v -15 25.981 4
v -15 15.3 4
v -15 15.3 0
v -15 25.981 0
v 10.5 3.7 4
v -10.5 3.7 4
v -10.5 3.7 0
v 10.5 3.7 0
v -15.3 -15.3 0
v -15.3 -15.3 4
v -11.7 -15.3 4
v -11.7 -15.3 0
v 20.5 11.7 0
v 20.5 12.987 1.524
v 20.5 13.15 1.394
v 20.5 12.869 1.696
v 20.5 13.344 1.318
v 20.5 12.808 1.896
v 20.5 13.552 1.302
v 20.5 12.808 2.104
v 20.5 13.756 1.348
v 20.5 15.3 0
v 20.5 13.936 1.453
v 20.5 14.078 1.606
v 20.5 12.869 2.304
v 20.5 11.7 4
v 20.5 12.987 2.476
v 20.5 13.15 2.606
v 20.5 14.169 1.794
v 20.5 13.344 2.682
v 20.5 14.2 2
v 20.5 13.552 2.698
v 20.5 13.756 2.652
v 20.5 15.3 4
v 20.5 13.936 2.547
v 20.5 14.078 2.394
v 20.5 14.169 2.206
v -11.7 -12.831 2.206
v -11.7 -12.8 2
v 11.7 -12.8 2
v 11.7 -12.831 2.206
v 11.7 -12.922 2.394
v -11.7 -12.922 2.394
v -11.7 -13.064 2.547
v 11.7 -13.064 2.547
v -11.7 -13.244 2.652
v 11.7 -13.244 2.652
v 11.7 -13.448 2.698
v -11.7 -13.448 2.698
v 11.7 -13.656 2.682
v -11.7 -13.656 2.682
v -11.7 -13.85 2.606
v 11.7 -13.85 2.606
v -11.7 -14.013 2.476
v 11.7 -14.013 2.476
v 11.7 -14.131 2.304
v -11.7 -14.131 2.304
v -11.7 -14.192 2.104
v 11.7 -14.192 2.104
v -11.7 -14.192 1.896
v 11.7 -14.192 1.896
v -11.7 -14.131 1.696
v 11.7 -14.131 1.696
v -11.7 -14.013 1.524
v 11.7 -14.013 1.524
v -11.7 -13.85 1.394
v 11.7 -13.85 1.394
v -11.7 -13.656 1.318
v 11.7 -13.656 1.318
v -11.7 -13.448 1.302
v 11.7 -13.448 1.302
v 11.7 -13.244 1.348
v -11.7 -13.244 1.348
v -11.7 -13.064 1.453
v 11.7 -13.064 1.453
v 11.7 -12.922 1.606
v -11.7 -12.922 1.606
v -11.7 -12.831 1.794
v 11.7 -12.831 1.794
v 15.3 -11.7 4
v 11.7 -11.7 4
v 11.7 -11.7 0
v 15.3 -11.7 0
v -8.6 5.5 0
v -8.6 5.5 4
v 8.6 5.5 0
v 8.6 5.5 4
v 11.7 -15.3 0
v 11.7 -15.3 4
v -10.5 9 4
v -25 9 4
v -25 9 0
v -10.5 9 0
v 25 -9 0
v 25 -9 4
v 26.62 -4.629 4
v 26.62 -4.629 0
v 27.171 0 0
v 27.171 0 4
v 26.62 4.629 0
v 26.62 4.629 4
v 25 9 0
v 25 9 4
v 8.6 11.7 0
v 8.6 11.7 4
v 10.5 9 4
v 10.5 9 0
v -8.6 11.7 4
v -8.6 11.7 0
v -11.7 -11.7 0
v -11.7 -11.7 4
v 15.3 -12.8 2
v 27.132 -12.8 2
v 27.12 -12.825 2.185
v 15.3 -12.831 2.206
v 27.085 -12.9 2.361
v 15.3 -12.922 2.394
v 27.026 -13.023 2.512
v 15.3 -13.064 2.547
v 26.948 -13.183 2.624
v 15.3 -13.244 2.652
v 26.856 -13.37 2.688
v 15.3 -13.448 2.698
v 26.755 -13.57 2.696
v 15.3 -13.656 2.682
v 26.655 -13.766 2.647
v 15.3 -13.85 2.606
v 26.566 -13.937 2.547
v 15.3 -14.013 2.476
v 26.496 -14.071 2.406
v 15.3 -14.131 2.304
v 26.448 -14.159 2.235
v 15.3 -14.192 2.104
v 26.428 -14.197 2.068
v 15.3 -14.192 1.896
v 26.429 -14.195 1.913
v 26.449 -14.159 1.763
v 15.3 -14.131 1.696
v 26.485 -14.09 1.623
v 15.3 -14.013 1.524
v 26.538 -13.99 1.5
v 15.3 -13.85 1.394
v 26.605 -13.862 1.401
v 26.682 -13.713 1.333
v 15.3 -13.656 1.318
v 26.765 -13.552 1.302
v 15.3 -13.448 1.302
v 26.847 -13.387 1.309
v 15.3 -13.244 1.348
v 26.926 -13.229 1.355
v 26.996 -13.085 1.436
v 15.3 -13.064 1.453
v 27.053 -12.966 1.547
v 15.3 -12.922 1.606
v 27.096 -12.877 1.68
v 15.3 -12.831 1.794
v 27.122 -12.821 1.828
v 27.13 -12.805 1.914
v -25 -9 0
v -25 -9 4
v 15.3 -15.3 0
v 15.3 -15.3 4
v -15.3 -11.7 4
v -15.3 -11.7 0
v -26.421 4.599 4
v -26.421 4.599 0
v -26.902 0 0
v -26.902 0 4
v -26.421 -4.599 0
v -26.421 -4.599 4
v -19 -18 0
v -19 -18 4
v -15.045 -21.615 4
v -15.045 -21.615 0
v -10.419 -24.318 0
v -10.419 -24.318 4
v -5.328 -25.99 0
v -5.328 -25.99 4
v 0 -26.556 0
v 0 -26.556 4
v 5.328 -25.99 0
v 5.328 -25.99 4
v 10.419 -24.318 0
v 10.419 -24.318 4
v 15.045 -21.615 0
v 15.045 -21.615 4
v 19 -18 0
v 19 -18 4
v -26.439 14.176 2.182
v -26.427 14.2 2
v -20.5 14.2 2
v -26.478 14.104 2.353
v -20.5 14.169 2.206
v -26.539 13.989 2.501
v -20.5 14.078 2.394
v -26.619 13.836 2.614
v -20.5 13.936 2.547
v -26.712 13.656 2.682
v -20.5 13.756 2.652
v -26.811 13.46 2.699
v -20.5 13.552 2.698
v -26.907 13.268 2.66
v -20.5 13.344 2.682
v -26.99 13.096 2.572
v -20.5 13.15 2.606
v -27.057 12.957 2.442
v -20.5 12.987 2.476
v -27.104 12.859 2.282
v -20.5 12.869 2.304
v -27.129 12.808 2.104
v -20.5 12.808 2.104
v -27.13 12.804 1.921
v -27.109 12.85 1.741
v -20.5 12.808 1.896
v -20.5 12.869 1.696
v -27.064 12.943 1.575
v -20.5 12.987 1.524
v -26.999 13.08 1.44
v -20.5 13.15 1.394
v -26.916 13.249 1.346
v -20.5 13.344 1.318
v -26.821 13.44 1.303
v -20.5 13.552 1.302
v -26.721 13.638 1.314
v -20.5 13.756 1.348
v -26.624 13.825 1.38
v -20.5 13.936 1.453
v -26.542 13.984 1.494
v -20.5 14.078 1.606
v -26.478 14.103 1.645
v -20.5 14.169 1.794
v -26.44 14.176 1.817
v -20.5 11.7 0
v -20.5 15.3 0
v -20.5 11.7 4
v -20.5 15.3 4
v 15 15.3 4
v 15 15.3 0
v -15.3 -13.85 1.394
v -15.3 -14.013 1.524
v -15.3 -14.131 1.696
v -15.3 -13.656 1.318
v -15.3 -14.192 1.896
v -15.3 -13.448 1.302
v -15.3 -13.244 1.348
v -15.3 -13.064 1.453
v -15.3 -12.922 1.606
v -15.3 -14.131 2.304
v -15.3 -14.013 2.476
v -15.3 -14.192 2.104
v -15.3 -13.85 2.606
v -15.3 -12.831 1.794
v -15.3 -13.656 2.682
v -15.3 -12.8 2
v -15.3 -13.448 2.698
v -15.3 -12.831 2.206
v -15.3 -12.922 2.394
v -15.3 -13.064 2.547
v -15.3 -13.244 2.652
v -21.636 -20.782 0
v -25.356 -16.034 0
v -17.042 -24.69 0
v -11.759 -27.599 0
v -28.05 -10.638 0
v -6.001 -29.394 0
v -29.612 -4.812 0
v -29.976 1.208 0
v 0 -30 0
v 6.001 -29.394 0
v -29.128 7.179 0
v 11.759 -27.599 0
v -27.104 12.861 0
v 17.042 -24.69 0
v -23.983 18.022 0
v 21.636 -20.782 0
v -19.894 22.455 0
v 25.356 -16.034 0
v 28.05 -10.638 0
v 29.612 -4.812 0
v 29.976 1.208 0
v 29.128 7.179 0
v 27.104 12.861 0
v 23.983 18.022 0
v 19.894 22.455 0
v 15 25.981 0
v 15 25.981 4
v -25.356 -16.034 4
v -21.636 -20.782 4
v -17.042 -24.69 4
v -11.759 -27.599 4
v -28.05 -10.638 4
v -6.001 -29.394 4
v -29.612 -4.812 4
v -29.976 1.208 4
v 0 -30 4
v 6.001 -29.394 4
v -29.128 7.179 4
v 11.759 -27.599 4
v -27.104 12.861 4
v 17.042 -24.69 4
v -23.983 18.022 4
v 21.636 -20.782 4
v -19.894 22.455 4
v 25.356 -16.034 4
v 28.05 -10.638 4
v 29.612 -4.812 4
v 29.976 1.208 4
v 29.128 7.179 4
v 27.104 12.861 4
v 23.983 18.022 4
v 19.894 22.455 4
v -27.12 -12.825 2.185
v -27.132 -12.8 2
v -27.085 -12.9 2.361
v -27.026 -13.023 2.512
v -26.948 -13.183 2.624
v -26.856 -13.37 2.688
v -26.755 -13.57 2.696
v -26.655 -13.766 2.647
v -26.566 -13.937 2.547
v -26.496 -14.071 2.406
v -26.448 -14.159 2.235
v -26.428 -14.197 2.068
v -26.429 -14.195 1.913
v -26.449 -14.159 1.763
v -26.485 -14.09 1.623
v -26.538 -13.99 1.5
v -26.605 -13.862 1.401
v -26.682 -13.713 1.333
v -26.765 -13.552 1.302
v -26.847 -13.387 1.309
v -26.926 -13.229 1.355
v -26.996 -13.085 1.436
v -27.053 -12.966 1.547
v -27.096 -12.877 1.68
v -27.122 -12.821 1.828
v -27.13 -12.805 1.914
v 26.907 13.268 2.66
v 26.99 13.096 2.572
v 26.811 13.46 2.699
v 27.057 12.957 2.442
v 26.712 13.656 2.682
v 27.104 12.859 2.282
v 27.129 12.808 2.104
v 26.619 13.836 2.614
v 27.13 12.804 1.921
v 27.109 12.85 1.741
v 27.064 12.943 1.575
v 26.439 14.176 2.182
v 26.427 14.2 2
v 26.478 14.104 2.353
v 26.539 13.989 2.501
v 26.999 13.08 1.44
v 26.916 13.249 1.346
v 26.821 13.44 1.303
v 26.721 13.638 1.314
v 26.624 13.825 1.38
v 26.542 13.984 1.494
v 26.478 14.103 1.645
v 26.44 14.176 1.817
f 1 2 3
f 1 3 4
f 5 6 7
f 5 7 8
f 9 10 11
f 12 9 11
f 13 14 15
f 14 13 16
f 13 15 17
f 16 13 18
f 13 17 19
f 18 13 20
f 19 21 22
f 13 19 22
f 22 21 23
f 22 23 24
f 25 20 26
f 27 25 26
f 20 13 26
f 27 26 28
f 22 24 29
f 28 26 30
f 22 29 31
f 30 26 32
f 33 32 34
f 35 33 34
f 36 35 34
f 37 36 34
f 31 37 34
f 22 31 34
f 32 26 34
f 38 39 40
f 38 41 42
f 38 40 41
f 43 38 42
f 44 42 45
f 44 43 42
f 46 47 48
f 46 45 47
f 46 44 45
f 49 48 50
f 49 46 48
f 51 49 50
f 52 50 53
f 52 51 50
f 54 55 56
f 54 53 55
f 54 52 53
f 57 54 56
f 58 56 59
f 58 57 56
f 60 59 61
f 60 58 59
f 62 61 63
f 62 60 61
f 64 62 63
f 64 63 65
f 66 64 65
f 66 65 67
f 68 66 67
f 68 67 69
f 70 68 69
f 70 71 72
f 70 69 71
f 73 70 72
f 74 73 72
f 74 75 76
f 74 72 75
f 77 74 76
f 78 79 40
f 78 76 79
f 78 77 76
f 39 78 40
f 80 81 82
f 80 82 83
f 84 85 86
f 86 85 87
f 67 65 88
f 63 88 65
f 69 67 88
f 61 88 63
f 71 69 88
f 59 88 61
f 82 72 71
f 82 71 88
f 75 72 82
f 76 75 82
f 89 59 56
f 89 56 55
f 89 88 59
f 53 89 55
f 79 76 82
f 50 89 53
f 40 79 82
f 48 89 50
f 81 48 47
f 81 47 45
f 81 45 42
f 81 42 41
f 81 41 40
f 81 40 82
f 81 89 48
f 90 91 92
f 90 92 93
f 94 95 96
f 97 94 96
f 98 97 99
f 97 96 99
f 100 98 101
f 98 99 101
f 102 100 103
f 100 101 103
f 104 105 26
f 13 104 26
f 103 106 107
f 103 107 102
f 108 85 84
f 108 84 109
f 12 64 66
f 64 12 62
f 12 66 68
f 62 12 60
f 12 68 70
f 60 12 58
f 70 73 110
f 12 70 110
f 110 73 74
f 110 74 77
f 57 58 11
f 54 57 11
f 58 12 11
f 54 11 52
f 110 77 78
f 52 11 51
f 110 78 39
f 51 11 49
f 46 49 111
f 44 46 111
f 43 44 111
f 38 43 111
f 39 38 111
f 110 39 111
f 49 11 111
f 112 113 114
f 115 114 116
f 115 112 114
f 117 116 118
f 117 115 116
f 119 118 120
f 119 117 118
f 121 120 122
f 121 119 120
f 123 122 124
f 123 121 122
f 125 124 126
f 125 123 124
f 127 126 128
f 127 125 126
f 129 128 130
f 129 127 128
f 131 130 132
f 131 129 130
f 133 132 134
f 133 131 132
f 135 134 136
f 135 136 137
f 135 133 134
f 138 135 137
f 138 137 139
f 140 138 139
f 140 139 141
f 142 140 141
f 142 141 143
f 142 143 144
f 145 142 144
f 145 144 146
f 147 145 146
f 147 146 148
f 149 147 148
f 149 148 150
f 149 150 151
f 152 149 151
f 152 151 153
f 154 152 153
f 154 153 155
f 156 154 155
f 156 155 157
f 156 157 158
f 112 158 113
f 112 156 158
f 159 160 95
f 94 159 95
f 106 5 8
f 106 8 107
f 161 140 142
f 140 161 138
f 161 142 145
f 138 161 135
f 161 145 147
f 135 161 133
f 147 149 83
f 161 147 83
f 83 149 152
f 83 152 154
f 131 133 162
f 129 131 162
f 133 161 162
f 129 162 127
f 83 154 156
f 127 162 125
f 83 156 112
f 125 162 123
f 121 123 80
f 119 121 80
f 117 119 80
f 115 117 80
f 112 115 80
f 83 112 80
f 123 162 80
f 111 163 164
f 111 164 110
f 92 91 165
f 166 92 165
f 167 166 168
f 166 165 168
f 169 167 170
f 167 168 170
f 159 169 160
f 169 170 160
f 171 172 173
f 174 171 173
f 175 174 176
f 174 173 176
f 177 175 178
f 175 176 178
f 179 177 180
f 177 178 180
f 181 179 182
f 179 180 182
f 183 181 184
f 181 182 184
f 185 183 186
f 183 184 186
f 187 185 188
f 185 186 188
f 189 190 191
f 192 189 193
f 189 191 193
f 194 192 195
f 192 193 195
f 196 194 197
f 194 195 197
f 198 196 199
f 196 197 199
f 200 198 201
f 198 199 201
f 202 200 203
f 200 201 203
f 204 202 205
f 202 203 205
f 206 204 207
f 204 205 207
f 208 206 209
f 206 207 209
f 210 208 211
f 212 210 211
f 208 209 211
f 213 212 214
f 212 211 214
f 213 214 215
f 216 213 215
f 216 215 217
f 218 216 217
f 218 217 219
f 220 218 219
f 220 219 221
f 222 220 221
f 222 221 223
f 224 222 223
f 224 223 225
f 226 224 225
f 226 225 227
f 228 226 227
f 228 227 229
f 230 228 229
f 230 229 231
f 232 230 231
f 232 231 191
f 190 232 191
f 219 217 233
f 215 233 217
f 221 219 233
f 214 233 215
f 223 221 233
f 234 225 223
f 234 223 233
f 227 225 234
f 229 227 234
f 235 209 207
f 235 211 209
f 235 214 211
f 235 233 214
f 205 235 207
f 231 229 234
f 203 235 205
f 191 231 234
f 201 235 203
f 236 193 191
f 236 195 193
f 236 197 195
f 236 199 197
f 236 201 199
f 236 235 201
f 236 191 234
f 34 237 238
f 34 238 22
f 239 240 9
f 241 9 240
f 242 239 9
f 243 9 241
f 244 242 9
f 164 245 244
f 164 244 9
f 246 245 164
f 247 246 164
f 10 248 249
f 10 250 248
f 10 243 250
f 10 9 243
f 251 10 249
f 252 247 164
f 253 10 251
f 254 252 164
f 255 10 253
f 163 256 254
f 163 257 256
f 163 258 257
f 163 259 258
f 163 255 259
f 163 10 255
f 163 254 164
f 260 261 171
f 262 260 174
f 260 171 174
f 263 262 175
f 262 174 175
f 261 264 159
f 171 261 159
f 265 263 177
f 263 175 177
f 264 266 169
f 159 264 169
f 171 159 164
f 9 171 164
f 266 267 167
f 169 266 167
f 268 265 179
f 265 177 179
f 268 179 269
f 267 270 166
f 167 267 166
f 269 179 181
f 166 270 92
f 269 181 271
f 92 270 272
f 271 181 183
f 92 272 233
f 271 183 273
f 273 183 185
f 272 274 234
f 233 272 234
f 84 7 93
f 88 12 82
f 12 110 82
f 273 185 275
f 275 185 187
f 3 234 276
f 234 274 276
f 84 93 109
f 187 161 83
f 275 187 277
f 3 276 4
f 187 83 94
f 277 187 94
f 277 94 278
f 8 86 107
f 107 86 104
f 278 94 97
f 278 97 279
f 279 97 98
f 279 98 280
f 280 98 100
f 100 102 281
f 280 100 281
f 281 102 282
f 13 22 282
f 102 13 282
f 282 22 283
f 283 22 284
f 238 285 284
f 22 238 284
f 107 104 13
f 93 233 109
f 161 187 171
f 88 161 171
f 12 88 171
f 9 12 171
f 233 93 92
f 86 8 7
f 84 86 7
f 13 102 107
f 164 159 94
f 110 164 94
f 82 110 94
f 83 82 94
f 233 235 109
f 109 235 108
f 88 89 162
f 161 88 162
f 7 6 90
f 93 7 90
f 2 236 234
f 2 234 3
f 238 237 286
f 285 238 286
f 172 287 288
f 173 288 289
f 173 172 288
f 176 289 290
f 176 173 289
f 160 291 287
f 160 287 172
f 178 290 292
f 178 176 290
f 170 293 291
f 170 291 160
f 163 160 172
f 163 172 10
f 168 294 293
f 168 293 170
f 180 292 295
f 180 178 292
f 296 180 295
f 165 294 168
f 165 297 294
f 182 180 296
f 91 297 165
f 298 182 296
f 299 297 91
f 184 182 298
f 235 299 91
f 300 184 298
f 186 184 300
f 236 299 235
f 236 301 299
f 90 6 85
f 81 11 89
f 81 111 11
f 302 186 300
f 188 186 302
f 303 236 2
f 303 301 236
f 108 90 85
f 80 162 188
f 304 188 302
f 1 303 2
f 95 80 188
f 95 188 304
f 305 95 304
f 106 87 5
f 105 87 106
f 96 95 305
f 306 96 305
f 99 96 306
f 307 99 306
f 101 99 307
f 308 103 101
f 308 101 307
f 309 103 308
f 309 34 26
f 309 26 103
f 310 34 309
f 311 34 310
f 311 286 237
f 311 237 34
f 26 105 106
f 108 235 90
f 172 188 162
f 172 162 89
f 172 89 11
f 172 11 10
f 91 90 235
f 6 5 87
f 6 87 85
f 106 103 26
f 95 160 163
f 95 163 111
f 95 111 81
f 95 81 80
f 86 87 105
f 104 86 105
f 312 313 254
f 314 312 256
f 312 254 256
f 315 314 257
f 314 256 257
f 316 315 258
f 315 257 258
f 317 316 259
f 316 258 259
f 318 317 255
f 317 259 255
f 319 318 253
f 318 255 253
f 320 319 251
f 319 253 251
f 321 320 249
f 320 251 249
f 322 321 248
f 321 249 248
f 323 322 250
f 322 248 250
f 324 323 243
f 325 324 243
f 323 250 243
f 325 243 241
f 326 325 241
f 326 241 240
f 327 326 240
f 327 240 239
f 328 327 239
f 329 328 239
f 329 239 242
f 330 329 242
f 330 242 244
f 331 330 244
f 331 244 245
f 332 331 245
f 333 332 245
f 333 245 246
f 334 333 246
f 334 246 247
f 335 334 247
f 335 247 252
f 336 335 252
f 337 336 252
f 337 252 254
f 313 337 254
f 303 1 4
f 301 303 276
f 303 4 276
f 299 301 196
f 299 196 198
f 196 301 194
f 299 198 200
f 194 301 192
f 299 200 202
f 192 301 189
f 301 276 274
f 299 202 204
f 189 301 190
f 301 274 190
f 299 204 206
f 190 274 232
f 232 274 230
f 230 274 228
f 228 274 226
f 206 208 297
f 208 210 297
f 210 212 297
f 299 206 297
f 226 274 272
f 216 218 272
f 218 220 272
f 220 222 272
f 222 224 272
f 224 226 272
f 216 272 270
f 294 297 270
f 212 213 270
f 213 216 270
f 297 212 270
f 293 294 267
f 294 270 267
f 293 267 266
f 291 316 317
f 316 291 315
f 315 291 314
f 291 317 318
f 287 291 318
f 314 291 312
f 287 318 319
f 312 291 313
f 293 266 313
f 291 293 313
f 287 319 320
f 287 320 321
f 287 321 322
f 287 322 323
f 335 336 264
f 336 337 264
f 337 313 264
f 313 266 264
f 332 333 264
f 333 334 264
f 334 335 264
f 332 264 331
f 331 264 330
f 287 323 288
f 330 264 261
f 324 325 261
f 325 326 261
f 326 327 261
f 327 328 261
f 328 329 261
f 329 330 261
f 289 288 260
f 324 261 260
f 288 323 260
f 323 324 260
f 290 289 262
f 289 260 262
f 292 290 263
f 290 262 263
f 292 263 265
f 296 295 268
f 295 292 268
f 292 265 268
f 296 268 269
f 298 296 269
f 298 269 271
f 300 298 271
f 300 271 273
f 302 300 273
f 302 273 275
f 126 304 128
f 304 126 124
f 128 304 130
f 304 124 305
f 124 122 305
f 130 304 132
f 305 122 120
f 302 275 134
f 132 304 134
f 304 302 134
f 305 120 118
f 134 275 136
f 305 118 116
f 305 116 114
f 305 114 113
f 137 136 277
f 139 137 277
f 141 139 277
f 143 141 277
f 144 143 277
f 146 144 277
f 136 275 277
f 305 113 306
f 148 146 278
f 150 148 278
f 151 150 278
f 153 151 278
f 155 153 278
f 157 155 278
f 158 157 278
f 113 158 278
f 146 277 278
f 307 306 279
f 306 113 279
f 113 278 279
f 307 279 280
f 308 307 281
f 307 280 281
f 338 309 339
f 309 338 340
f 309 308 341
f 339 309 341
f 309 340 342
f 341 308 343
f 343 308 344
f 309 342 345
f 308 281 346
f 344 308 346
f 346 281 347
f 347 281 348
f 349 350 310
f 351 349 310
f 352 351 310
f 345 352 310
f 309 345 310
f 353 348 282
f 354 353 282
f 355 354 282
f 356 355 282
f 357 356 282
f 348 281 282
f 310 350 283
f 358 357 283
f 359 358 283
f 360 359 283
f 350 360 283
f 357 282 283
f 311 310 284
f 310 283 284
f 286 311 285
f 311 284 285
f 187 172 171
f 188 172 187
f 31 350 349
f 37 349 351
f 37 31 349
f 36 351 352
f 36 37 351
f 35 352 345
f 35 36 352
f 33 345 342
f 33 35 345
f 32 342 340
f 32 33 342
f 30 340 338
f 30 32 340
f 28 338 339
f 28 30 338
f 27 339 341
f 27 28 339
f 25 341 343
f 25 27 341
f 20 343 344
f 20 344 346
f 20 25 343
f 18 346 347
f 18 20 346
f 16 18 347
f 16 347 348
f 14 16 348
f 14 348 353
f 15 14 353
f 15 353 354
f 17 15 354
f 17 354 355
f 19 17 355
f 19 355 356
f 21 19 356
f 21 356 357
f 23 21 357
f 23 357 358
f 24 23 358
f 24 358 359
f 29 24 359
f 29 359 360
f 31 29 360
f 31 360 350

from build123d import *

# Parameters (mm, degrees)
SKETCH_R             = 30
PAD_DEPTH            = 4
SKETCH001_W          = 3.6
SKETCH001_H          = 3.6
POCKET_DEPTH         = 5
SKETCH002_W          = 41
SKETCH002_H          = 3.6
POCKET001_DEPTH      = 5
SKETCH003_W          = 30
SKETCH003_H          = 18
POCKET002_DEPTH      = 5
POCKET003_DEPTH      = 5
SKETCH005_R          = 0.7
POCKET004_DEPTH      = 14.701
POCKET004_DEPTH_BACK = -45.301
SKETCH006_R          = 0.7
POCKET005_DEPTH      = 9.501
POCKET005_DEPTH_BACK = -50.501
SKETCH007_W          = 21
SKETCH007_H          = 5.3
PAD001_DEPTH         = 4
SKETCH008_W          = 17.2
SKETCH008_H          = 6.2
POCKET006_DEPTH      = 5


with BuildPart() as part:
    # Sketch → Pad (new body)
    with BuildSketch(Plane.XY):
        Circle(SKETCH_R)
    extrude(amount=PAD_DEPTH)

    # Sketch001 (on Face3 of Pad) → Pocket (cut)
    with BuildSketch(Plane.XY.offset(4)):
        with Locations((-13.5, -13.5)):
            Rectangle(SKETCH001_W, SKETCH001_H)
        with Locations((13.5, -13.5)):
            Rectangle(SKETCH001_W, SKETCH001_H)
    extrude(amount=-POCKET_DEPTH, mode=Mode.SUBTRACT)

    # Sketch002 (on Face3 of Pocket) → Pocket001 (cut)
    with BuildSketch(Plane.XY.offset(4)):
        with Locations((0, 13.5)):
            Rectangle(SKETCH002_W, SKETCH002_H)
    extrude(amount=-POCKET001_DEPTH, mode=Mode.SUBTRACT)

    # Sketch003 (on Face3 of Pocket001) → Pocket002 (cut)
    with BuildSketch(Plane.XY.offset(4)):
        with Locations((0, 24.3)):
            Rectangle(SKETCH003_W, SKETCH003_H)
    extrude(amount=-POCKET002_DEPTH, mode=Mode.SUBTRACT)

    # Sketch004 (on Face3 of Pocket002) → Pocket003 (cut)
    with BuildSketch(Plane.XY.offset(4)):
        with BuildLine():
            Line((-25, 9), (25, 9))
            ThreePointArc((25, -9), (27.170645, 0), (25, 9))
            Line((-25, -9), (25, -9))
            ThreePointArc((-25, 9), (-26.90179, 0), (-25, -9))
        make_face()
        with BuildLine():
            Line((-19, -18), (19, -18))
            ThreePointArc((-19, -18), (0, -26.556025), (19, -18))
        make_face()
    extrude(amount=-POCKET003_DEPTH, mode=Mode.SUBTRACT)

    # Sketch005 (on Face12 of Pocket003) → Pocket004 (cut, two sides)
    with BuildSketch(Plane.YZ.offset(-15.3)) as pocket004_sk:
        with Locations((-13.5, 2)):
            Circle(SKETCH005_R)
    extrude(amount=-POCKET004_DEPTH, mode=Mode.SUBTRACT)
    extrude(pocket004_sk.sketch, amount=-POCKET004_DEPTH_BACK, mode=Mode.SUBTRACT)

    # Sketch006 (on Face6 of Pocket004) → Pocket005 (cut, two sides)
    with BuildSketch(Plane.YZ.offset(-20.5)) as pocket005_sk:
        with Locations((13.5, 2)):
            Circle(SKETCH006_R)
    extrude(amount=-POCKET005_DEPTH, mode=Mode.SUBTRACT)
    extrude(pocket005_sk.sketch, amount=-POCKET005_DEPTH_BACK, mode=Mode.SUBTRACT)

    # Sketch007 (on Face24 of Pocket005) → Pad001 (join)
    with BuildSketch(Plane.XY.offset(4)):
        with Locations((0, 6.35)):
            Rectangle(SKETCH007_W, SKETCH007_H)
    extrude(amount=-PAD001_DEPTH)

    # Sketch008 (on Face26 of Pad001) → Pocket006 (cut)
    with BuildSketch(Plane.XY.offset(4)):
        with Locations((0, 8.6)):
            Rectangle(SKETCH008_W, SKETCH008_H)
    extrude(amount=-POCKET006_DEPTH, mode=Mode.SUBTRACT)


solid = part.part
